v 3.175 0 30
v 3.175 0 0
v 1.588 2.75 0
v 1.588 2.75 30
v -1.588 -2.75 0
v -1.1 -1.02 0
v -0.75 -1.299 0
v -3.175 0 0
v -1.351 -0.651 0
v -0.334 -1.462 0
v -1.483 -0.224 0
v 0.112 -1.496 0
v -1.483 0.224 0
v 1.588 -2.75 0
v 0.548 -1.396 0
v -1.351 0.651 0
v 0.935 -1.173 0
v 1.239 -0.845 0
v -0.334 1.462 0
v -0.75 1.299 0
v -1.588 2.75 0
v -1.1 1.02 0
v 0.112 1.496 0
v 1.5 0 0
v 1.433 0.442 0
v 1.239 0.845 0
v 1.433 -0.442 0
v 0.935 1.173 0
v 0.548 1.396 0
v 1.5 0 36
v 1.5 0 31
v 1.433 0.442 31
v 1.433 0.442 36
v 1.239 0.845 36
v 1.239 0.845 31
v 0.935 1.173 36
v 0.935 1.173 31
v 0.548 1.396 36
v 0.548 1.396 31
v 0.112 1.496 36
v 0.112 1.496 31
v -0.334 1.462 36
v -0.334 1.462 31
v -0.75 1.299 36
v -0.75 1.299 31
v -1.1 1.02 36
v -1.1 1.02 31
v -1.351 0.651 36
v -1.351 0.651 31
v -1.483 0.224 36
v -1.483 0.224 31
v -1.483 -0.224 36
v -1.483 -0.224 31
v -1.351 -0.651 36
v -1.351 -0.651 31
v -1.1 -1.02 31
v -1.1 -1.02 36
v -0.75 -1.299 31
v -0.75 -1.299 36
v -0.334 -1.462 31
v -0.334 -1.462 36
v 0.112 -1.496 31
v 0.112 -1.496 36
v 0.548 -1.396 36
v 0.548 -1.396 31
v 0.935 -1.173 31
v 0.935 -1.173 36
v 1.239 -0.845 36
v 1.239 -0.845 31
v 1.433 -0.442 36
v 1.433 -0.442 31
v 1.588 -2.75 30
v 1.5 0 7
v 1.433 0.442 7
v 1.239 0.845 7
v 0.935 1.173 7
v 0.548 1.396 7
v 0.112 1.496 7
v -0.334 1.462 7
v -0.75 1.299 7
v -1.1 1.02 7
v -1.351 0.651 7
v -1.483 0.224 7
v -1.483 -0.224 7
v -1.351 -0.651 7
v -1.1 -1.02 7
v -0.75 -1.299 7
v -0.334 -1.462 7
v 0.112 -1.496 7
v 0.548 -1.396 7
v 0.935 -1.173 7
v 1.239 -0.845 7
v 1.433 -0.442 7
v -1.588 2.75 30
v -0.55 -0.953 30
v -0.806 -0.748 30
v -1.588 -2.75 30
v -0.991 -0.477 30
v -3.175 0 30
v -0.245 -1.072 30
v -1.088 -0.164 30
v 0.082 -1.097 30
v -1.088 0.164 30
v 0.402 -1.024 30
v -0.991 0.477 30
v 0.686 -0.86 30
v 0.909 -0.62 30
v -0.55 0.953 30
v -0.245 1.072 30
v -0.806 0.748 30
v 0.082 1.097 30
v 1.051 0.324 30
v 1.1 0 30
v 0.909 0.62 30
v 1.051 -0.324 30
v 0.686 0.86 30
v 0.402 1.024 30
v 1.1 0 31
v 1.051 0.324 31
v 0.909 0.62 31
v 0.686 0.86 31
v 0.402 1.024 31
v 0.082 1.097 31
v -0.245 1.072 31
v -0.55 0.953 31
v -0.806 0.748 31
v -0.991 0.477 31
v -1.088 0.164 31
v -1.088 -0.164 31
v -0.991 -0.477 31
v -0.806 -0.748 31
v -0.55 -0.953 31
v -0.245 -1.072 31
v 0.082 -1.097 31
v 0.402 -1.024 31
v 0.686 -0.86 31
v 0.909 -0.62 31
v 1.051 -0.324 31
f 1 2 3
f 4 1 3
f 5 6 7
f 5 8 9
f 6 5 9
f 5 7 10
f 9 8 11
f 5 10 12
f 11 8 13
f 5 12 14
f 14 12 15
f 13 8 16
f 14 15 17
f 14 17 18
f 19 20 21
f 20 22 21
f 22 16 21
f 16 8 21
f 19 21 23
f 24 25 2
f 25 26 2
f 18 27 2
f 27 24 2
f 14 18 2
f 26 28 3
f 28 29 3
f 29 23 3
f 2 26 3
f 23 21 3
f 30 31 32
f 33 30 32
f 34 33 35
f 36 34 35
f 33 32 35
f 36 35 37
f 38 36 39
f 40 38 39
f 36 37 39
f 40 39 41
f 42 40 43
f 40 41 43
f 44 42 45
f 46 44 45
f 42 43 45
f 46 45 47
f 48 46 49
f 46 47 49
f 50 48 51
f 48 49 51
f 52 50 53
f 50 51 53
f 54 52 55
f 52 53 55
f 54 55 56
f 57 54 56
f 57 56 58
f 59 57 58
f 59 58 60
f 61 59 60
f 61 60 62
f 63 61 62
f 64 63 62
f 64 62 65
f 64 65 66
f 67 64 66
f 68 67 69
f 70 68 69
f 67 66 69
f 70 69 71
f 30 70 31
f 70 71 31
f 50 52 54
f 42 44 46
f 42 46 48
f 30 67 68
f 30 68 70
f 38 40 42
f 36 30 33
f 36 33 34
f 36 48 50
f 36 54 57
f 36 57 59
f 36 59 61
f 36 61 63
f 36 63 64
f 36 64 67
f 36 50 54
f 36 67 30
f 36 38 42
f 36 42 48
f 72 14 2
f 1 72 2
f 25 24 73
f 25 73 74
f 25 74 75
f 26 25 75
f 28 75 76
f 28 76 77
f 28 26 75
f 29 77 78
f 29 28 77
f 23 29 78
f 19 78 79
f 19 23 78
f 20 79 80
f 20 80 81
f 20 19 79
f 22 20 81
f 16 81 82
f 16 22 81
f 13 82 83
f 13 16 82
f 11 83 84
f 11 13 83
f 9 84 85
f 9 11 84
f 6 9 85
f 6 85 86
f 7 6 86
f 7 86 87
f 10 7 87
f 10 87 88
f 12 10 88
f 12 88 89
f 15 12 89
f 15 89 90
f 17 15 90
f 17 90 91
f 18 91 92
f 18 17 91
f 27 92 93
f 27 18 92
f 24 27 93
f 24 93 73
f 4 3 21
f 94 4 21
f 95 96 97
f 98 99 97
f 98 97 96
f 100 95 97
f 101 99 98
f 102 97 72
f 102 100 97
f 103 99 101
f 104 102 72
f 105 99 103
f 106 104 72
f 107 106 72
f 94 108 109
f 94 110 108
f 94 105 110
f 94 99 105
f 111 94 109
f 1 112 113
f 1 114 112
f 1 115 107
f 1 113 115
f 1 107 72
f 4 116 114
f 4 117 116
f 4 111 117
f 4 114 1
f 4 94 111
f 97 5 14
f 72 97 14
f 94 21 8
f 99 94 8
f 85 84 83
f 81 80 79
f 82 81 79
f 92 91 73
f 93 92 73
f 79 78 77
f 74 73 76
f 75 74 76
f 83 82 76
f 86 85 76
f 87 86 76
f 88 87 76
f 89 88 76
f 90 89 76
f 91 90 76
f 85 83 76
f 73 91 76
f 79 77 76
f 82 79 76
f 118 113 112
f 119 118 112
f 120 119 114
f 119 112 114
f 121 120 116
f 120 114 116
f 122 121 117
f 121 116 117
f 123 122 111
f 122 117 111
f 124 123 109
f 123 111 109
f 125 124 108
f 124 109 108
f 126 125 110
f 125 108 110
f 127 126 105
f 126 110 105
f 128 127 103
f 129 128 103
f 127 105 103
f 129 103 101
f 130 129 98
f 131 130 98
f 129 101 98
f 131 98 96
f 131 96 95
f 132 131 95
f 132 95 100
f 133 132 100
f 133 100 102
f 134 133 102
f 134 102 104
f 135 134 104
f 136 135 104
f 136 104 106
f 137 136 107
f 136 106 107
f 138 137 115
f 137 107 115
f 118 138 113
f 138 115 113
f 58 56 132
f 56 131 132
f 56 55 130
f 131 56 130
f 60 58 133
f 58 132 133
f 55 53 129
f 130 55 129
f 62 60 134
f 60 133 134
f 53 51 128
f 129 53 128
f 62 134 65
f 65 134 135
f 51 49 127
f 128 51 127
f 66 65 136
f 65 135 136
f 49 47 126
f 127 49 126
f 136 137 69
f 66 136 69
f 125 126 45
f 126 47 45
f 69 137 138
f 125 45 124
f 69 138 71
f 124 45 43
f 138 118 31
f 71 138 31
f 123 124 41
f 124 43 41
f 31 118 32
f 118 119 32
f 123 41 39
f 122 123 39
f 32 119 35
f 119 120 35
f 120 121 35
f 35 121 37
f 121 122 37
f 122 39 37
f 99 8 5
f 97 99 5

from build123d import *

# Parameters (mm, degrees)
F1_DEPTH = 30
F2_R     = 1.1
F3_DEPTH = 1
F4_R     = 1.5
F5_DEPTH = 5
F6_R     = 1.5
F7_DEPTH = 7


with BuildPart() as f1:
    # F0 (on Top) → F1 (new body)
    with BuildSketch(Plane.XY):
        Polygon((1.5877132403, 2.75), (-1.5877132403, 2.75), (-3.1754264805, 0), (-1.5877132403, -2.75), (1.5877132403, -2.75), (3.1754264805, 0), align=None)
    extrude(amount=F1_DEPTH)

    # F2 (on face) → F3 (join)
    with BuildSketch(Plane.XY.offset(30)):
        Circle(F2_R)
    extrude(amount=F3_DEPTH)

    # F4 (on face) → F5 (join)
    with BuildSketch(Plane.XY.offset(31)):
        Circle(F4_R)
    extrude(amount=F5_DEPTH)

    # F6 (on Top) → F7 (cut)
    with BuildSketch(Plane.XY):
        Circle(F6_R)
    extrude(amount=F7_DEPTH, mode=Mode.SUBTRACT)


solid = f1.part
